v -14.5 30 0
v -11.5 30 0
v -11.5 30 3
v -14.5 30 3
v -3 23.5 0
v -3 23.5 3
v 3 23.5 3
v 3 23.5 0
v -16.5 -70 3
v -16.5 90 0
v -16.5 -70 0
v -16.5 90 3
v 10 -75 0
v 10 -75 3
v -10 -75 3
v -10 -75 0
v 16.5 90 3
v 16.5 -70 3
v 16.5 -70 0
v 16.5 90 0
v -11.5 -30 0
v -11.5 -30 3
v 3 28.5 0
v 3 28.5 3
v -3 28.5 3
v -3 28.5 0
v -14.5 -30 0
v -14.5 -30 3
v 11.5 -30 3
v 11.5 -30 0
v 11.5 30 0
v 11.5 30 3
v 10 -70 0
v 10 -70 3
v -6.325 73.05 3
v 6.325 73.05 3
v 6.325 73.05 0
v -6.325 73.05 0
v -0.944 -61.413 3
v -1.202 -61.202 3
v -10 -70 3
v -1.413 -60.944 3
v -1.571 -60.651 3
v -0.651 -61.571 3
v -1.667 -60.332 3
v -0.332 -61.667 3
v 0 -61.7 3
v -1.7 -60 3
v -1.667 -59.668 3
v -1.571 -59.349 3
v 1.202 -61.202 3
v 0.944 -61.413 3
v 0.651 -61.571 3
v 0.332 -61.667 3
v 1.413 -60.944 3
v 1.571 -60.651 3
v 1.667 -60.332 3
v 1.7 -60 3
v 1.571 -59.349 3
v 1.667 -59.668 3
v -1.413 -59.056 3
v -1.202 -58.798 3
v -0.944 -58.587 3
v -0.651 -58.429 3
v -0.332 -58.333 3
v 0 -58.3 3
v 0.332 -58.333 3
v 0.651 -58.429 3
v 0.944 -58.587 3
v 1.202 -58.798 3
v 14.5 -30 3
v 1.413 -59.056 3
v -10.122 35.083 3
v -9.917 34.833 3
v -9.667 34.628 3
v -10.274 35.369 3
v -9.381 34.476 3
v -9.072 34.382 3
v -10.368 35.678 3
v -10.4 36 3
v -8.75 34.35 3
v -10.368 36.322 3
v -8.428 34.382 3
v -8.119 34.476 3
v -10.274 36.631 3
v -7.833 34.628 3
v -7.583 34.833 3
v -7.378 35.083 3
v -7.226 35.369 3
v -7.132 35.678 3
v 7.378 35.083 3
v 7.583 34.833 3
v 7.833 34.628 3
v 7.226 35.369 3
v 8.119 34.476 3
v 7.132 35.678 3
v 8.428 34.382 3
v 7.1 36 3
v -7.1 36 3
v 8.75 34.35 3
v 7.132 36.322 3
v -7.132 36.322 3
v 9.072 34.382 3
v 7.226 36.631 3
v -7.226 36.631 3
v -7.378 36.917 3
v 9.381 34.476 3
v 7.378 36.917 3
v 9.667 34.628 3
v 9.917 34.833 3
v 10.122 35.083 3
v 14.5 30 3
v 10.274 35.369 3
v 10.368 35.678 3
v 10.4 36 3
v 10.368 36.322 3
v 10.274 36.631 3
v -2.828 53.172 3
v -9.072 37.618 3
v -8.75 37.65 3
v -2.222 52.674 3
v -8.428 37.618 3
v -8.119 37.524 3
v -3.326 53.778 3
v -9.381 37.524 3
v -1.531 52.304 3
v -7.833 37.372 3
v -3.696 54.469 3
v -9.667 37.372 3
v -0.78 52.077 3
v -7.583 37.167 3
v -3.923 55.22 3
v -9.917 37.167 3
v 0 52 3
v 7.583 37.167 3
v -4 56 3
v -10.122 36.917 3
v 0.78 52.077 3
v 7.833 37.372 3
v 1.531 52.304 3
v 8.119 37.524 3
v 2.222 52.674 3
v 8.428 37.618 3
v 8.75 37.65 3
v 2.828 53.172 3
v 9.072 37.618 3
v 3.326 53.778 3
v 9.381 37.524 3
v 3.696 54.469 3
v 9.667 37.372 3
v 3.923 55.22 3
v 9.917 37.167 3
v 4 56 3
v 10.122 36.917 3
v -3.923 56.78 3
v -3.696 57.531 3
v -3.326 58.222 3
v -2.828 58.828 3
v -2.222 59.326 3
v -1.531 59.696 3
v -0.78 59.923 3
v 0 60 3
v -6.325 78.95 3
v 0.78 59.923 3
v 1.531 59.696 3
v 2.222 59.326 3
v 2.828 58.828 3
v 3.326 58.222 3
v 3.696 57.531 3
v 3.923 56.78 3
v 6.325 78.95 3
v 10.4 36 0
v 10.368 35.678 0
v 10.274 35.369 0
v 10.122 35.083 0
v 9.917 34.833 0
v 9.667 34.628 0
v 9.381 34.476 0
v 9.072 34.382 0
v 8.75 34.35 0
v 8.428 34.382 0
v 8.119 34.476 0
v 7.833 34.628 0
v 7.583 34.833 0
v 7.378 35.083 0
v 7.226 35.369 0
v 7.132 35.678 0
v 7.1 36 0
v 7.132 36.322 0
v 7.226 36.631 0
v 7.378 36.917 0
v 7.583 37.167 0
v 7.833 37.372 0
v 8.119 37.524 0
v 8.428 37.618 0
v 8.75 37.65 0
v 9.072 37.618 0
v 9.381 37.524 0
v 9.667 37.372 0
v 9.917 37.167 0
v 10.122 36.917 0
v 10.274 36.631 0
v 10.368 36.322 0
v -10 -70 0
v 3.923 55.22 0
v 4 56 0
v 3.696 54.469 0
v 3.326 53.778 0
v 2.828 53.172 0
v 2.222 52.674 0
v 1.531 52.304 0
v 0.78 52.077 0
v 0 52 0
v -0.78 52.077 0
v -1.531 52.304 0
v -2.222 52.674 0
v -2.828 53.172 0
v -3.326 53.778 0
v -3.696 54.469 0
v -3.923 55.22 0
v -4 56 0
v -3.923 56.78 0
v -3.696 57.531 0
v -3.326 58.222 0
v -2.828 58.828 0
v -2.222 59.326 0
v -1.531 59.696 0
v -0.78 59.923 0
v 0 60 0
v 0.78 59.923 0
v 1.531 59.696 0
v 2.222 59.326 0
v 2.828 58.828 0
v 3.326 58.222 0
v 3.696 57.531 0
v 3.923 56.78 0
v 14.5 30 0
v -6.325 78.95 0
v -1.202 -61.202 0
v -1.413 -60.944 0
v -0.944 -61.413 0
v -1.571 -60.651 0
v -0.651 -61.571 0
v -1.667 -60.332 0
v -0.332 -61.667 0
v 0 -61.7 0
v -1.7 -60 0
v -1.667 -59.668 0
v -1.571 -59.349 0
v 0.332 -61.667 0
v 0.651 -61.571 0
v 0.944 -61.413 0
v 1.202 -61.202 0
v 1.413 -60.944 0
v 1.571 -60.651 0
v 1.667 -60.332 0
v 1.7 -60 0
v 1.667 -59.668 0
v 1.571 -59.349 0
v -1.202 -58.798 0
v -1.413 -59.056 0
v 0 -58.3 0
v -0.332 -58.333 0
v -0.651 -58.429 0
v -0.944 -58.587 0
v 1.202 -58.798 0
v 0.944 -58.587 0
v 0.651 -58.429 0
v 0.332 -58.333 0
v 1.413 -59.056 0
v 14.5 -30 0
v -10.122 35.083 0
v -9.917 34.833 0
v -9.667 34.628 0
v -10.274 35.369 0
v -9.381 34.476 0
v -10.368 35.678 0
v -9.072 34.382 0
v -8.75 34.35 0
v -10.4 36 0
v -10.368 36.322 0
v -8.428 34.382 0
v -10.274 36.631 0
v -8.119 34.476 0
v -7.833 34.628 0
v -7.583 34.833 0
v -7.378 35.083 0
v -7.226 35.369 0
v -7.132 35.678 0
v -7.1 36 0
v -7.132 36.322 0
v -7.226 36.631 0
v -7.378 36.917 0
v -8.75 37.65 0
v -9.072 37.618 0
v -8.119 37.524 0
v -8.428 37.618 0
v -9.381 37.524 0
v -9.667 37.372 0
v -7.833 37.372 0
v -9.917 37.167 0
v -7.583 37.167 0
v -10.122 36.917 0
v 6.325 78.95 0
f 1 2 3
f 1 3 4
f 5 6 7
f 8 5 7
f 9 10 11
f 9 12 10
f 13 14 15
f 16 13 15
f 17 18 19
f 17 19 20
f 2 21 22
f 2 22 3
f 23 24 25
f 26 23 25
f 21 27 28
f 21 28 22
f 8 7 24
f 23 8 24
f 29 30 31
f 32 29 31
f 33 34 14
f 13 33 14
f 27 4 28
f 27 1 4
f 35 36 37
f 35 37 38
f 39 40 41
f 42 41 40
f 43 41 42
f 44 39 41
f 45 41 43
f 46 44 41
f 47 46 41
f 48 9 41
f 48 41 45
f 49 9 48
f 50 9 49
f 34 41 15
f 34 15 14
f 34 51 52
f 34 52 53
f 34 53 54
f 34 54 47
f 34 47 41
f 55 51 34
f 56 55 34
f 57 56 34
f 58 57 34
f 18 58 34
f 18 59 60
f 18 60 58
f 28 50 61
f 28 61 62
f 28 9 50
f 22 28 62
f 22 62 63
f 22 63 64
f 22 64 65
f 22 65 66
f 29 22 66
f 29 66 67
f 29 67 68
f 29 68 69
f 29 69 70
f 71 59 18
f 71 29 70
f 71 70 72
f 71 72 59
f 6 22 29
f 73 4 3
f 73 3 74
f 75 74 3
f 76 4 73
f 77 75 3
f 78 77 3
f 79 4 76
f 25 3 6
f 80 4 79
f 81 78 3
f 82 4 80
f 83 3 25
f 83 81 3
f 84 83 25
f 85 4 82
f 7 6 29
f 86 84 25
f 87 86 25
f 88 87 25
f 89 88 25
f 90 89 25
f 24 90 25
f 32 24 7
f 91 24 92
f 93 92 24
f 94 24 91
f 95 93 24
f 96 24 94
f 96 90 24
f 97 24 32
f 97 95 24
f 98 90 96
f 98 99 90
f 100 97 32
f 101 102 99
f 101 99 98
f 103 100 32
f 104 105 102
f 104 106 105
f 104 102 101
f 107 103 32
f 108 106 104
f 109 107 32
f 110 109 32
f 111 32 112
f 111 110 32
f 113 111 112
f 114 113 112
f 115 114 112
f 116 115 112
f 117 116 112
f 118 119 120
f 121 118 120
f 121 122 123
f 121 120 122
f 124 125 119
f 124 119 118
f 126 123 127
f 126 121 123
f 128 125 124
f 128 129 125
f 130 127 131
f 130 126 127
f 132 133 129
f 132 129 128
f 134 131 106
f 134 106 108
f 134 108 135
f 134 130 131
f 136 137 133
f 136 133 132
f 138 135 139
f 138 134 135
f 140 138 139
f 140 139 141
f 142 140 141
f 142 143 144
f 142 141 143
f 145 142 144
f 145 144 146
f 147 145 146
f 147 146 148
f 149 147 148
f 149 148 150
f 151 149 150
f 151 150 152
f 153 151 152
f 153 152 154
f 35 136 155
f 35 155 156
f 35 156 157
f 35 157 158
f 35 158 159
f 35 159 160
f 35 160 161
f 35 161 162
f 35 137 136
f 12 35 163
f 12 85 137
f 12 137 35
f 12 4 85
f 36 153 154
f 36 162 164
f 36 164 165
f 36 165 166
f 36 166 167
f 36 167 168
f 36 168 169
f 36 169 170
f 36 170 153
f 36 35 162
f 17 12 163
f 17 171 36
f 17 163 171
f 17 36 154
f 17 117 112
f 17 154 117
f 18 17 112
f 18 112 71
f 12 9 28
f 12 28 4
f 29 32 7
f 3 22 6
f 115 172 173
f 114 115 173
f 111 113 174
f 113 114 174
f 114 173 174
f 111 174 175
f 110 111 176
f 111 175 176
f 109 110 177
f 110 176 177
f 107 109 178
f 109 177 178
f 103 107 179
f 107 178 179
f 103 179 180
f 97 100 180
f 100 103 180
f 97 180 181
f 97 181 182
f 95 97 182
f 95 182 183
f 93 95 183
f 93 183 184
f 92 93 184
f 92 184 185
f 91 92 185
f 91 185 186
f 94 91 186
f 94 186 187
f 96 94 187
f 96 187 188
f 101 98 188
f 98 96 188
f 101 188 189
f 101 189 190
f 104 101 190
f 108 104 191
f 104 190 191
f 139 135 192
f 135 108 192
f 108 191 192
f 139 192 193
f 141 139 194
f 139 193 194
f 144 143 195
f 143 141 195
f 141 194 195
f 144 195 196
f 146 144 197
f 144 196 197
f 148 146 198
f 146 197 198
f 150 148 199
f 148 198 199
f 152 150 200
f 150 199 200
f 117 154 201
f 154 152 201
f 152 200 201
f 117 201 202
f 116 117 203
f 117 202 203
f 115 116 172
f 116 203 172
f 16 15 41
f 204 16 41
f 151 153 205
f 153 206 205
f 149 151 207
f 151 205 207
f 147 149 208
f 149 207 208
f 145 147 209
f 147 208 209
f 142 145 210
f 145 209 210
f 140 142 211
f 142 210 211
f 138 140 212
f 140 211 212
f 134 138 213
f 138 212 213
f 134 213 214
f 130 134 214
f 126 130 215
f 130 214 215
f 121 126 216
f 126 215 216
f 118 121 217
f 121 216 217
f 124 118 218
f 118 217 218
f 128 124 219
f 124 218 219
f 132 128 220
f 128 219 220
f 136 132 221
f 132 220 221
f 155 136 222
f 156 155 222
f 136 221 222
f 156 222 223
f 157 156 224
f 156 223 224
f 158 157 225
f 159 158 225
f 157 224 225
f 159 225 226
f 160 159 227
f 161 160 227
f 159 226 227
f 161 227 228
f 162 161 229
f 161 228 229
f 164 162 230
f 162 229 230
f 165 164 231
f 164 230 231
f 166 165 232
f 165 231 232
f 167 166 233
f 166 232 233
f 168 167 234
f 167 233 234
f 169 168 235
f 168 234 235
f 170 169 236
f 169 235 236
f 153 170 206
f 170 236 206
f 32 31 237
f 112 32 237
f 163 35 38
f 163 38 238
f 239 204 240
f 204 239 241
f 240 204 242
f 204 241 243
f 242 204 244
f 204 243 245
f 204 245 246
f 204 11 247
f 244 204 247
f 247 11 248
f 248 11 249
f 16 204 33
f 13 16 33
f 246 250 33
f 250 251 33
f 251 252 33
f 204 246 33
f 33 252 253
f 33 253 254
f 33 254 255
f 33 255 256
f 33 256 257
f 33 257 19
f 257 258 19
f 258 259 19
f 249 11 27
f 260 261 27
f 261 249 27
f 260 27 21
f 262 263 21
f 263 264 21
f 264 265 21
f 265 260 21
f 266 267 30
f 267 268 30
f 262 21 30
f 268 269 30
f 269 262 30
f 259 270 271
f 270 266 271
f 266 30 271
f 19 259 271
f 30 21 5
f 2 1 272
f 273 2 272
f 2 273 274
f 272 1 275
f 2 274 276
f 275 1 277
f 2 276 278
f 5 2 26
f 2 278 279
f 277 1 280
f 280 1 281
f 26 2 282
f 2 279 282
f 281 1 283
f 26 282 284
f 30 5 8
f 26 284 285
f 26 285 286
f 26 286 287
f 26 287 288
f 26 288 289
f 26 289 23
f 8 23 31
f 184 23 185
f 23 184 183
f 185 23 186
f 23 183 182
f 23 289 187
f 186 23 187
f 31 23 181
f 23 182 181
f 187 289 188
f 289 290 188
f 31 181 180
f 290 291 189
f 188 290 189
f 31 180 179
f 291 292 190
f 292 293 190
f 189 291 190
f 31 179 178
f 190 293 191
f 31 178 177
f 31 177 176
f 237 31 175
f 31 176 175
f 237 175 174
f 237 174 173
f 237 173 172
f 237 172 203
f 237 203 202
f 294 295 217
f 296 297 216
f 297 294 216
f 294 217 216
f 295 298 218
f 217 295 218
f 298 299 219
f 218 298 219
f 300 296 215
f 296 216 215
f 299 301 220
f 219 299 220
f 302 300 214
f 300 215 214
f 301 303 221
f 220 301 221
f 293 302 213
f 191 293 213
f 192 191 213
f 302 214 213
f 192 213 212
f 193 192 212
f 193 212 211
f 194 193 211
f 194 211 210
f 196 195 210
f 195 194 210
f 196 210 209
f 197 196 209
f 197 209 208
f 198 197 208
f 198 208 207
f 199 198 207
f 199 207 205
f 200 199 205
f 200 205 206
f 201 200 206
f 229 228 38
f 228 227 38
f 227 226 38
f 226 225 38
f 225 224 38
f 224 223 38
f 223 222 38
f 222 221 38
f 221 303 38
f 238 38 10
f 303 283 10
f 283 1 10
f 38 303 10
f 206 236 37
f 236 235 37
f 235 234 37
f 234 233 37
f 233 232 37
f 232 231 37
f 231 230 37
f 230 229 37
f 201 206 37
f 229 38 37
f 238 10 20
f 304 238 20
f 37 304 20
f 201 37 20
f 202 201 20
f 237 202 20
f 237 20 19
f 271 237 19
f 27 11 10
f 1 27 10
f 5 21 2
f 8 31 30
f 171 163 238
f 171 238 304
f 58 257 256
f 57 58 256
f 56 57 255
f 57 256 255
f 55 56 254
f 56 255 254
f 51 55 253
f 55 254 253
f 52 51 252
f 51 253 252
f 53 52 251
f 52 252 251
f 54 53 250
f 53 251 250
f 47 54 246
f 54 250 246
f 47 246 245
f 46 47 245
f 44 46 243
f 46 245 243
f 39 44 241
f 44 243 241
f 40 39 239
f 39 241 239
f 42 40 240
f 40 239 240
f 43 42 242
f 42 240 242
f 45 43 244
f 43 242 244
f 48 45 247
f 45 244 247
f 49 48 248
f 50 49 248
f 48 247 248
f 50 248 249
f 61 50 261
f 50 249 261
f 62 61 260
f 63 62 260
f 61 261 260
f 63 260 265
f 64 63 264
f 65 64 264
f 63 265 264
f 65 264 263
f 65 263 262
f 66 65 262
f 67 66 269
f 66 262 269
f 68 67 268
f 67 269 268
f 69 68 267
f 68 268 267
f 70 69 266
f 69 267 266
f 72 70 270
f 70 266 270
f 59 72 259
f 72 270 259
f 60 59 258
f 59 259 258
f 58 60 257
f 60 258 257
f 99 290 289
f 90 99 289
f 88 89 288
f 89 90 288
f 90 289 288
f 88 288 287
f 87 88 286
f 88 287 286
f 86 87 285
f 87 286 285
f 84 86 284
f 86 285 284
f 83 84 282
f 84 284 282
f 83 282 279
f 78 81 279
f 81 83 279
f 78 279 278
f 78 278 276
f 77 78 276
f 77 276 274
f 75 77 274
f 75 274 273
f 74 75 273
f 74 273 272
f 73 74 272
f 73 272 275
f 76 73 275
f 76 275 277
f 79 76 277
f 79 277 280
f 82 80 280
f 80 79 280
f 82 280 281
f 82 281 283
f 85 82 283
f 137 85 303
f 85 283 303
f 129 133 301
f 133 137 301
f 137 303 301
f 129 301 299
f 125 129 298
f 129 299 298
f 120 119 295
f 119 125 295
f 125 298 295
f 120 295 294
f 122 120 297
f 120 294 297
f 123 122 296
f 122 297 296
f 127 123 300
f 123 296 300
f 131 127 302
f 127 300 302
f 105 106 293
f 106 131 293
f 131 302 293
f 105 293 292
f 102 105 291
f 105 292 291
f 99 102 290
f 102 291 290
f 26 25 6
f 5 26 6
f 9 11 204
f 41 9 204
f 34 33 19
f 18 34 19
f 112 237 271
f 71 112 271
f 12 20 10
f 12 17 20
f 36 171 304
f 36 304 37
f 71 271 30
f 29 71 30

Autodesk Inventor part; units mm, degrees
ref_plane "YZ Plane" through (0, 0, 0) normal (1, 0, 0) x (0, 1, 0)
ref_plane "XZ Plane" through (0, 0, 0) normal (0, 1, 0) x (-1, 0, 0)
ref_plane "XY Plane" through (0, 0, 0) normal (0, 0, 1) x (1, 0, 0)
sketch "Sketch1" plane through (0, 0, 0) normal (0, 0, 1) x (1, 0, 0)
  line L0 (-16.5, -70) -> (16.5, -70)
  line L1 (16.5, -70) -> (16.5, 70)
  line L2 (16.5, 70) -> (-16.5, 70)
  line L3 (-16.5, 70) -> (-16.5, -70)
  line L4 (-16.5, -70) -> (16.5, 70) construction
  line L5 (16.5, -70) -> (-16.5, 70) construction
  line L6 (0, 70) -> (0, -70)
  line L7 (11.5, 30) -> (14.5, 30)
  line L8 (14.5, 30) -> (14.5, -30)
  line L9 (14.5, -30) -> (11.5, -30)
  line L10 (11.5, -30) -> (11.5, 30)
  line L11 (-11.5, 30) -> (-14.5, 30)
  line L12 (-14.5, -30) -> (-11.5, -30)
  line L13 (-14.5, 30) -> (-14.5, -30)
  line L14 (-11.5, -30) -> (-11.5, 30)
  circle A0 centre (0, -60) radius 1.7
  circle A1 centre (0, 56) radius 10
  line L15 (-10, 56) -> (10, 56)
  line L16 (-6.3196, 63.75) -> (6.3196, 63.75)
  line L17 (-6.3196, 48.25) -> (6.3196, 48.25)
  circle A2 centre (8.75, 36) radius 1.65
  circle A3 centre (-8.75, 36) radius 1.65
  circle A4 centre (0, 56) radius 4
  point P0 (0, 0)
  point P1 (0, 0)
  point P2 (14.5, 0)
  point P3 (16.5, 0)
  point P4 (-14.5, 0)
  point P5 (0, 0)
  point P6 (-6.3196, 48.25)
  point P7 (6.3196, 48.25)
  dimension "d0" = 140
  dimension "d1" = 3
  dimension "d2" = 2
  dimension "d3" = 60
  dimension "d6" = 3.4
  dimension "d7" = 10
  dimension "d9" = 23
  dimension "d13" = 14
  dimension "d14" = 20
  dimension "d15" = 15.5
  dimension "d17" = 3.3
  dimension "d18" = 20
  dimension "d19" = 17.5
  dimension "d22" = 8
extrude "Plate1" add sketch "Sketch1" along normal blind 3 contours L3 L2 L6 A1 A0 L0 | L6 A0 A1 L2 L1 L0 | A1 L16 L6 | L6 L16 A1 | A1 L17 L6 | L6 L17 A1 | L16 A1 L15 A4 L6 | L6 A4 L15 A1 L16 | L17 A1 L15 A4 L6 | L6 A4 L15 A1 L17
sketch "Sketch3" plane through (0, 0, 3) normal (0, 0, 1) x (1, 0, 0)
  line L0 (-16.5, 70) -> (-16.5, -70)
  line L1 (-16.5, 70) -> (16.5, 70)
  line L2 (16.5, 70) -> (16.5, 90)
  line L3 (16.5, 90) -> (-16.5, 90)
  line L4 (-16.5, 90) -> (-16.5, 70)
  line L5 (-16.5, 0) -> (16.5, 0)
  line L6 (16.5, -70) -> (16.5, 70)
  point P0 (0, 0)
  dimension "d23" = 20
sheet face with bend "Face2" sketch "Sketch3" thickness 3 toward (0, 0, -1) bend radius 3 contours L4 L3 L2 L1
bend "Bend1"
sketch "Sketch4" plane through (0, 0, 3) normal (0, 0, 1) x (1, 0, 0)
  line L0 (-10, -70) -> (10, -70)
  line L1 (10, -70) -> (10, -75)
  line L2 (10, -75) -> (-10, -75)
  line L3 (-10, -75) -> (-10, -70)
  line L4 (16.5, -70) -> (-16.5, -70)
  point P0 (0, 0)
  point P1 (0, -70)
  point P2 (0, -70)
  point P3 (0, -70)
  dimension "d29" = 20
  dimension "d30" = 5
sheet face with bend "Face3" sketch "Sketch4" thickness 3 toward (0, 0, -1) bend radius 3
bend "Bend2"
sketch "Sketch5" plane through (0, 0, 3) normal (0, 0, 1) x (1, 0, 0)
  line L0 (-3, 23.5) -> (3, 23.5)
  line L1 (3, 23.5) -> (3, 28.5)
  line L2 (3, 28.5) -> (-3, 28.5)
  line L3 (-3, 28.5) -> (-3, 23.5)
  line L4 (-3, 23.5) -> (3, 28.5) construction
  line L5 (3, 23.5) -> (-3, 28.5) construction
  circle A0 centre (0, 56) radius 4 projected
  point P0 (0, 0)
  point P1 (0, 26)
  dimension "d36" = 6
  dimension "d37" = 5
  dimension "d38" = 30
extrude "Cut1" cut sketch "Sketch5" against normal blind 3 contours L3 L2 L1 L0
sketch "Sketch6" plane through (0, 0, 3) normal (0, 0, 1) x (1, 0, 0)
  line L0 (-6.325, 78.95) -> (6.325, 78.95)
  line L1 (6.325, 78.95) -> (6.325, 73.05)
  line L2 (6.325, 73.05) -> (-6.325, 73.05)
  line L3 (-6.325, 73.05) -> (-6.325, 78.95)
  line L4 (-6.325, 78.95) -> (6.325, 73.05) construction
  line L5 (6.325, 78.95) -> (-6.325, 73.05) construction
  circle A0 centre (0, 56) radius 4 projected
  point P0 (0, 0)
  point P1 (0, 76)
  dimension "d41" = 12.65
  dimension "d42" = 5.9
  dimension "d43" = 20
extrude "Cut2" cut sketch "Sketch6" against normal blind 3 contours L0 L1 L2 L3
equation "\"d39\" = Thickness"
equation "\"d44\" = Thickness"
equation "\"d16\" = Thickness"
equation "\"d24\" = BendRadius"
equation "\"d25\" = BendReliefWidth"
equation "\"d27\" = MinimumRemnant"
equation "\"d26\" = BendReliefDepth"
equation "\"d28\" = TransitionRadius"
equation "\"d31\" = BendRadius"
equation "\"d32\" = BendReliefWidth"
equation "\"d34\" = MinimumRemnant"
equation "\"d33\" = BendReliefDepth"
equation "\"d35\" = TransitionRadius"
equation "\"BendRadius\" = Thickness"
equation "\"BendReliefWidth\" = Thickness"
equation "\"BendReliefDepth\" = 0.5 * Thickness"
equation "\"CornerReliefSize\" = 4 * Thickness"
equation "\"MinimumRemnant\" = 2 * Thickness"
equation "\"TransitionRadius\" = BendRadius"
equation "\"JacobiRadiusSize\" = BendRadius"
equation "\"GapSize\" = Thickness"
equation "\"Thickness\" = 3"
properties part number "Motor Fixation .1 FV"
